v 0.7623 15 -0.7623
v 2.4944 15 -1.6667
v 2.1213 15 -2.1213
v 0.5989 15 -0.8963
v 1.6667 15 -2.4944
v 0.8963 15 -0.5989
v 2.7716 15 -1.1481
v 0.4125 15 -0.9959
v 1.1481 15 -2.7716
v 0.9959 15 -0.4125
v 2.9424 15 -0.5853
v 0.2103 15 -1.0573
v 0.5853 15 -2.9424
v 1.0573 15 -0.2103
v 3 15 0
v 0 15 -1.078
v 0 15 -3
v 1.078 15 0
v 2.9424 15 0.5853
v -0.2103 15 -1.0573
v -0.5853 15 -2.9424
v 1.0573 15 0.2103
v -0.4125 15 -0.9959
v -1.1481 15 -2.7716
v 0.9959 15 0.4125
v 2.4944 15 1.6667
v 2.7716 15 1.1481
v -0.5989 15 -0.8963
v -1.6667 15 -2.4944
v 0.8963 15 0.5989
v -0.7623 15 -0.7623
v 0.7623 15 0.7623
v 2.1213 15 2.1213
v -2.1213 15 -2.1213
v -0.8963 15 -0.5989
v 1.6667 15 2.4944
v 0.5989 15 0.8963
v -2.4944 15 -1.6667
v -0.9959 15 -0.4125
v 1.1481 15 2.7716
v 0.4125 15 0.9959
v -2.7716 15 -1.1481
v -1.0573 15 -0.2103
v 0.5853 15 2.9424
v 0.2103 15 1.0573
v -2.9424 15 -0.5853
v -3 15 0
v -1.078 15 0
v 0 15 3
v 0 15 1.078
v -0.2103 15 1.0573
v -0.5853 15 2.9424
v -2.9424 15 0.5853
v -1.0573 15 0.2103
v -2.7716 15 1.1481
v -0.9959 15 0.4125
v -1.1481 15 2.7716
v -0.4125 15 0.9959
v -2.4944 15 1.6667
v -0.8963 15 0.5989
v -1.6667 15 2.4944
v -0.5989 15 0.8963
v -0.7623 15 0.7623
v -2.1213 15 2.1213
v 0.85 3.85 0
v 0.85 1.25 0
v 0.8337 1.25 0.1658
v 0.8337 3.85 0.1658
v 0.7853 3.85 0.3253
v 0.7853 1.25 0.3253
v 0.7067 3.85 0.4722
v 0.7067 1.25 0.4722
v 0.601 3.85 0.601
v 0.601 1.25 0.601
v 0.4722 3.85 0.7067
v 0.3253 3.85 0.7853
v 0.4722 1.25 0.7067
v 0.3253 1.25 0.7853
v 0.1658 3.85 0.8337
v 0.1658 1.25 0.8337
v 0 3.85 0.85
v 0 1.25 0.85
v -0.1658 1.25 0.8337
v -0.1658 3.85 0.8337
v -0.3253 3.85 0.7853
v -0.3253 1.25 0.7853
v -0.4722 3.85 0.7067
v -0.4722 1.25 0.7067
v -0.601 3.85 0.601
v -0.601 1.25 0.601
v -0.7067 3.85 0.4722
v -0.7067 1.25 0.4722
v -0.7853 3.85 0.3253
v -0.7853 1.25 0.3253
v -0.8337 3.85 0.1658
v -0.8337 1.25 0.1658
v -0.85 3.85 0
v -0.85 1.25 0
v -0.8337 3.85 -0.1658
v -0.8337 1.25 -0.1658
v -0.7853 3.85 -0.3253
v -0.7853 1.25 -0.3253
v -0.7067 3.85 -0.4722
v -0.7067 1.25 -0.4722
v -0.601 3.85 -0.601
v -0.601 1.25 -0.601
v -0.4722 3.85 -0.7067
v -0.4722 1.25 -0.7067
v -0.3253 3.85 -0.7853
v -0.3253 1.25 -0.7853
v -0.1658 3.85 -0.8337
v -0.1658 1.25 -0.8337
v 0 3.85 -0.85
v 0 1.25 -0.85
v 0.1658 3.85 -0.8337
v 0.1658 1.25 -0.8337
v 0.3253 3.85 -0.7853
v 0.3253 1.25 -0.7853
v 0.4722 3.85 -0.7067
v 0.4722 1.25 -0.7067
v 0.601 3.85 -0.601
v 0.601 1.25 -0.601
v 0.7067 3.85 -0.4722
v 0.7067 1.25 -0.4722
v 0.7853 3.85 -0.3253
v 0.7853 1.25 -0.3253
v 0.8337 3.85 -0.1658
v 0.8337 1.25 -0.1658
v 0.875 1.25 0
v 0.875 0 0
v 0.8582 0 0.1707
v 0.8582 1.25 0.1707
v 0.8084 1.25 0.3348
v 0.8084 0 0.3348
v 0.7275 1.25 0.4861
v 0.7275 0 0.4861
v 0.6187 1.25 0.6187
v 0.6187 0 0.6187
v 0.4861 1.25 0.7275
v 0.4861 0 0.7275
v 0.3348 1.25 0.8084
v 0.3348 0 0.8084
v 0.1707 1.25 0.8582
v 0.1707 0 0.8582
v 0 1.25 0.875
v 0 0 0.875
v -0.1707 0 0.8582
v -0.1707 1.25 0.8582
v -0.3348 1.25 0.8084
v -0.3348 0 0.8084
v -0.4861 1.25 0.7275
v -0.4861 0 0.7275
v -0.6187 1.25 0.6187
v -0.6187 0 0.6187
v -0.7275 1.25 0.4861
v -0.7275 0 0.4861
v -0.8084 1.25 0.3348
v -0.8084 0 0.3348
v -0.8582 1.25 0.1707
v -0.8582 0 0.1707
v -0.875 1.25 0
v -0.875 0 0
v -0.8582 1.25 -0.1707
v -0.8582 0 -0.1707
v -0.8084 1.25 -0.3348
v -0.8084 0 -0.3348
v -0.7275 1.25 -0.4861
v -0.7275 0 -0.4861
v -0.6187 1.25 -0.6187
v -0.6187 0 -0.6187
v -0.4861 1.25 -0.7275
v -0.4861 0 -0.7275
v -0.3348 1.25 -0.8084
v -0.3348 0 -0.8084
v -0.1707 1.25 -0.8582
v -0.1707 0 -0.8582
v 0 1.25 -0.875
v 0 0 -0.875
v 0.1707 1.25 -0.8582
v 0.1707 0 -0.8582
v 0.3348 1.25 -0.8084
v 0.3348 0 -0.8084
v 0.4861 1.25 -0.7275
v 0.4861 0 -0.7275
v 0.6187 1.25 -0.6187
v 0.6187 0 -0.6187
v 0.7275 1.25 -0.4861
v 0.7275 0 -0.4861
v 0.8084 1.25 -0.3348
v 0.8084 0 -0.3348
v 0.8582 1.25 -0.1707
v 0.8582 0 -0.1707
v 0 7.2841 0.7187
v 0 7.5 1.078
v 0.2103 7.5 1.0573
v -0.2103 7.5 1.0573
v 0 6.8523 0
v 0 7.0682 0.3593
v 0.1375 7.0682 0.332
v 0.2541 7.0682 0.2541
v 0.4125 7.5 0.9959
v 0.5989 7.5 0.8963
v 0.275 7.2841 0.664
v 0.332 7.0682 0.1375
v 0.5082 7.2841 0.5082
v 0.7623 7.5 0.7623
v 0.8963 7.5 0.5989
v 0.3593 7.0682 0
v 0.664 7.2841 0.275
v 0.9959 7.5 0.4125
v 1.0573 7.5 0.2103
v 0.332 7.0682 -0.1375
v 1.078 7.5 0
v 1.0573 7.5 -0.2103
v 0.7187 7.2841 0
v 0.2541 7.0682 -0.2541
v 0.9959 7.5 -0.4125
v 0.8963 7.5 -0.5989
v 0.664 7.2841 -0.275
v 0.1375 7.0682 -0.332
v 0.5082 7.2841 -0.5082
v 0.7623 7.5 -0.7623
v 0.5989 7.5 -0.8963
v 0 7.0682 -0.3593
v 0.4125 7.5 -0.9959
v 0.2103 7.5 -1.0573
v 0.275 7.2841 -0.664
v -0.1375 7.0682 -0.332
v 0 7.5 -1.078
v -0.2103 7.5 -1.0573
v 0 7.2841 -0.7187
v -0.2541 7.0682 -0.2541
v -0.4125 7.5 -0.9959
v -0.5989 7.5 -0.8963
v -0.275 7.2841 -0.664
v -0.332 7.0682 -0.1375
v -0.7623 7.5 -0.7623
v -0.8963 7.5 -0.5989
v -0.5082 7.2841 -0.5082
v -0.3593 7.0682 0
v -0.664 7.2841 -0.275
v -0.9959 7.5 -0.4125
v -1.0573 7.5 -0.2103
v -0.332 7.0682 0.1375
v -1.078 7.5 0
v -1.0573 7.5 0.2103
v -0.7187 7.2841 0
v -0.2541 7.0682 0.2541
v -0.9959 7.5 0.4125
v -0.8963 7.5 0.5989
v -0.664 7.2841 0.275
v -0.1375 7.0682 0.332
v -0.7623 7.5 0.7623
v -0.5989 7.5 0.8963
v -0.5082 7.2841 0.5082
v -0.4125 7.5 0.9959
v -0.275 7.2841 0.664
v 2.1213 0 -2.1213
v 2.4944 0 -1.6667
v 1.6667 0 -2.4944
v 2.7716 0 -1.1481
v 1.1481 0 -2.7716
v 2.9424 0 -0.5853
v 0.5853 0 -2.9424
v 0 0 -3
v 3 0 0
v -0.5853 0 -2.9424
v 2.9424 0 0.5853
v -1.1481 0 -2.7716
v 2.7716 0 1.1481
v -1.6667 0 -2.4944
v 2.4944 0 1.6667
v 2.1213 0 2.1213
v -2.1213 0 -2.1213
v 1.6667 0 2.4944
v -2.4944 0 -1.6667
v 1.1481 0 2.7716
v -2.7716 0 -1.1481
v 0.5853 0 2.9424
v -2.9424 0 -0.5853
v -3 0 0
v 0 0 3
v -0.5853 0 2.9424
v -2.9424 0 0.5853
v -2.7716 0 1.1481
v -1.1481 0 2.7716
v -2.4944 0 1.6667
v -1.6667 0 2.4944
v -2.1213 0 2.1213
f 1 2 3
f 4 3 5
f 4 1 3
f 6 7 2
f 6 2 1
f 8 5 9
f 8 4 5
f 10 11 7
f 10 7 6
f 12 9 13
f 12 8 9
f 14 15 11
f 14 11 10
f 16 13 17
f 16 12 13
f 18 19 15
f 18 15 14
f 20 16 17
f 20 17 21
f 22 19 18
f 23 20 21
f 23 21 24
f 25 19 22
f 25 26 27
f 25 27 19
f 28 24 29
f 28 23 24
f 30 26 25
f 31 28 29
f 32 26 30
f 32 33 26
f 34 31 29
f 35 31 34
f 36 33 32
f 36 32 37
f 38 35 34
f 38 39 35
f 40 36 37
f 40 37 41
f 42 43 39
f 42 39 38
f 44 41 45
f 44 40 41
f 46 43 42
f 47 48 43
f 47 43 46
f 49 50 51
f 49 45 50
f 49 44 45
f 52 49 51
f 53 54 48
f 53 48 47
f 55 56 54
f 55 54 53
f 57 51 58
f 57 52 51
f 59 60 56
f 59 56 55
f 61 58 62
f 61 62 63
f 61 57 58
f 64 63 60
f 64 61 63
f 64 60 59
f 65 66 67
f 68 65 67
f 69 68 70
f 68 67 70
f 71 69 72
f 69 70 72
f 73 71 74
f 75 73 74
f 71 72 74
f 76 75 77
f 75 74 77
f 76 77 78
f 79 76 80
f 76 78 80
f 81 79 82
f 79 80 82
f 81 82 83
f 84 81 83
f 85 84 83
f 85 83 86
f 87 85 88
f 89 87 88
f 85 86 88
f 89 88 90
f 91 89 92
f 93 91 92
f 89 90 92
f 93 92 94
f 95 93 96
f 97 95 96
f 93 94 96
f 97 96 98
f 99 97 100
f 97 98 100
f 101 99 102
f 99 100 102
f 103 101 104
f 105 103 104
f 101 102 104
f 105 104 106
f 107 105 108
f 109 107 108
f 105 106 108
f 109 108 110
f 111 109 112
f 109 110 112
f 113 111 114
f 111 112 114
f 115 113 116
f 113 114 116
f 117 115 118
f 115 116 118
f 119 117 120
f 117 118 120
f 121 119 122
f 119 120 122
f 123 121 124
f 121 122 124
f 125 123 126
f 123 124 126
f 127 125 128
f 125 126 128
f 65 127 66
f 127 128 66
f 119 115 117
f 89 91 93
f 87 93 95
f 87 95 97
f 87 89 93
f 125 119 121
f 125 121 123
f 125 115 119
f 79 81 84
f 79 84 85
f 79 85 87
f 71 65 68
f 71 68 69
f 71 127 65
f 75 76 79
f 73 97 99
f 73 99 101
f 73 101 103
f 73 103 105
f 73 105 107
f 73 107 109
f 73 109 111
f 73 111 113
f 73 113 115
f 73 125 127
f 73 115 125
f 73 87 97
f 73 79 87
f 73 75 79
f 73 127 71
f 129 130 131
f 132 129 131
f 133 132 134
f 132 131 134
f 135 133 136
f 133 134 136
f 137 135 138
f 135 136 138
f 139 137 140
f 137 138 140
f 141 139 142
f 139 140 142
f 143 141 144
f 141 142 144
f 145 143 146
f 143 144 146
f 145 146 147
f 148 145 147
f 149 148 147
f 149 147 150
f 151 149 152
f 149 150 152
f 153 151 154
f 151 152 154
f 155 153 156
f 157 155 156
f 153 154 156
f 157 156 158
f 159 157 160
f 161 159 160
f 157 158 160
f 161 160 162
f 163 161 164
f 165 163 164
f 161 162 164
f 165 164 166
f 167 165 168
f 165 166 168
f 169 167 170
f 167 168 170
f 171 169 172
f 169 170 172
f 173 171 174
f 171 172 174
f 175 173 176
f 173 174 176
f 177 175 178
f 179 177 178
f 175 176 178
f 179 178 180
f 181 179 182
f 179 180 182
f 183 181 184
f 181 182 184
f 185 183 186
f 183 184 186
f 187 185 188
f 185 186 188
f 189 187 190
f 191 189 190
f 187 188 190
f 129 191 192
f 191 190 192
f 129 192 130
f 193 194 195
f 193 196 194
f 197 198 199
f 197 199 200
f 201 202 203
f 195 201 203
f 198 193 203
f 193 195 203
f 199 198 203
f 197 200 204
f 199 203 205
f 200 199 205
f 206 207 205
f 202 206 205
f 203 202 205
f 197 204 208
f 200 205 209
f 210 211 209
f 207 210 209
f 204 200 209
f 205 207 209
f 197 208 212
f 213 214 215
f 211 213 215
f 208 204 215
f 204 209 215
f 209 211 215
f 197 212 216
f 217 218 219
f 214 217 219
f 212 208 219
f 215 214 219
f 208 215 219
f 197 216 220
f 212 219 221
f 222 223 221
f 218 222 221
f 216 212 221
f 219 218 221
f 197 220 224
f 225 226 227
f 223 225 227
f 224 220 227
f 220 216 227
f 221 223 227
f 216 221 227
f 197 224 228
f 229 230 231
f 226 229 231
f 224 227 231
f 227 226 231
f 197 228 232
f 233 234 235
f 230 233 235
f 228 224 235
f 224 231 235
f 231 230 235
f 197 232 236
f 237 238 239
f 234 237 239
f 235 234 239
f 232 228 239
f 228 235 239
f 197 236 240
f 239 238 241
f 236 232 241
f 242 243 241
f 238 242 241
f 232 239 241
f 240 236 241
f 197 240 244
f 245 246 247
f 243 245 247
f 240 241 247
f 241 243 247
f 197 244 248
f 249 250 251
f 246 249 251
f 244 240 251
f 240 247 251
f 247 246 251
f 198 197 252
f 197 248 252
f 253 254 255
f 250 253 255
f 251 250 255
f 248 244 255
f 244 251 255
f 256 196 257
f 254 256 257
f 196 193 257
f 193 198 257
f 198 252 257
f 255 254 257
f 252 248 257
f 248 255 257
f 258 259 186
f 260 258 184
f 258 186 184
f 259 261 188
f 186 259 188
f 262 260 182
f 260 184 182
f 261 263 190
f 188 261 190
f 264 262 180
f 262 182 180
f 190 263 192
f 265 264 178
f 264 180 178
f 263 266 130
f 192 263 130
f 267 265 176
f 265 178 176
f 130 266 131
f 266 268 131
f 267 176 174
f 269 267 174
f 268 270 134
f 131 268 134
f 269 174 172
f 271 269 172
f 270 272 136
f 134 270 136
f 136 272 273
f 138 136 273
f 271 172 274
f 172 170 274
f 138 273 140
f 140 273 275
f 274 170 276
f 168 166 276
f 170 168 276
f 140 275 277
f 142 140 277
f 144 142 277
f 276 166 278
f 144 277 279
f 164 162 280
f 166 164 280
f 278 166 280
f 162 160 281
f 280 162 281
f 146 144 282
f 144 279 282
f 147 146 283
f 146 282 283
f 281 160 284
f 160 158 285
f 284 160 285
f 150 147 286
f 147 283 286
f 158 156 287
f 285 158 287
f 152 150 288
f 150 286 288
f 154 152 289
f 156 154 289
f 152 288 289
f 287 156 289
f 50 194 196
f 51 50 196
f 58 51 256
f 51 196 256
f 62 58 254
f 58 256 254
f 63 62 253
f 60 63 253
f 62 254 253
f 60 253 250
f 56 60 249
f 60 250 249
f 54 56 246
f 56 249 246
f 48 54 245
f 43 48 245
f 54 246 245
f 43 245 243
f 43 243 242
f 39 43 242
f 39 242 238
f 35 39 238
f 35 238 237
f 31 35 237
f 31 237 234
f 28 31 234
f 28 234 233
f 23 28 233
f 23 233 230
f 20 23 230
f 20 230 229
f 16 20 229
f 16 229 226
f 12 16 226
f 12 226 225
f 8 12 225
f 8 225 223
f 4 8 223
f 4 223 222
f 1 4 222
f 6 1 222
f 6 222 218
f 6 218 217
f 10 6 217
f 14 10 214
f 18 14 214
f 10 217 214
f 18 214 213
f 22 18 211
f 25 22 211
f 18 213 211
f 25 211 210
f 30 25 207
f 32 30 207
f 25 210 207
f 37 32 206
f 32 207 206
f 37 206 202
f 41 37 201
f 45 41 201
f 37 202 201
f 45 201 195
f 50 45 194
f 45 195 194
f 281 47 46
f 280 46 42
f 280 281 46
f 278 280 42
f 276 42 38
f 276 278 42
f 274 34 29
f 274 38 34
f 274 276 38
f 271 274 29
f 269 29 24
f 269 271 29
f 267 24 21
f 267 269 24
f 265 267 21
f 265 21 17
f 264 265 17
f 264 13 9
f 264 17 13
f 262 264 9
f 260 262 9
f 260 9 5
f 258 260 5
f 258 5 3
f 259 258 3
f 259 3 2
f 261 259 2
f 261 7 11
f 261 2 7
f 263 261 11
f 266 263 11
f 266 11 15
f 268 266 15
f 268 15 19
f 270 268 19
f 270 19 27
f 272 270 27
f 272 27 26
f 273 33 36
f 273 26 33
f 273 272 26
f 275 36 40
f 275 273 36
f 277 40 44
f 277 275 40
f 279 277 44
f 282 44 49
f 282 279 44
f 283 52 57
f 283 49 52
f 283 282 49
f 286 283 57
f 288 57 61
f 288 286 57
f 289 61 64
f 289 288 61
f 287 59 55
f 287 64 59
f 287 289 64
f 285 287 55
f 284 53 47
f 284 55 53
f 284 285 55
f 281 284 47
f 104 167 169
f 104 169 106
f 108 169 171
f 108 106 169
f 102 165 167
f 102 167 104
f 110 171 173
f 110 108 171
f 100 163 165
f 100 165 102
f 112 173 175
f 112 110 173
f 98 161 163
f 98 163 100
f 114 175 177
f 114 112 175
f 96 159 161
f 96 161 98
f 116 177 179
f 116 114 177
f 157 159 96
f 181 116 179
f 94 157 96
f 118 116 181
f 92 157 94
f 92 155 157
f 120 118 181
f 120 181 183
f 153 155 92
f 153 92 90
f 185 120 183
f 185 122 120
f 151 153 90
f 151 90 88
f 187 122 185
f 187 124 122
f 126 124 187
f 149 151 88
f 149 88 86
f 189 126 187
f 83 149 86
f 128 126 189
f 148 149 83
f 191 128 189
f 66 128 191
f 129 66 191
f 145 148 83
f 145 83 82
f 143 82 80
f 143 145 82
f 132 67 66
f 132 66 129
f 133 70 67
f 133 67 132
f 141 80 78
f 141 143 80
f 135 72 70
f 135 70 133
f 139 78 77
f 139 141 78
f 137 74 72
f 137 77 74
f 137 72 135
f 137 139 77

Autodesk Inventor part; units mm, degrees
ref_plane "YZ Plane" through (0, 0, 0) normal (1, 0, 0) x (0, 1, 0)
ref_plane "XZ Plane" through (0, 0, 0) normal (0, 1, 0) x (-1, 0, 0)
ref_plane "XY Plane" through (0, 0, 0) normal (0, 0, 1) x (1, 0, 0)
sketch "Sketch1" plane through (0, 0, 0) normal (0, 1, 0) x (-1, 0, 0)
  circle A0 centre (0, 0) radius 3
  dimension "d0" = 6
extrude "Extrusion1" add sketch "Sketch1" along normal blind 15
sketch "Sketch2" plane through (0, 15, 0) normal (0, 1, 0) x (1, 0, 0)
  point P0 (0, 0)
  point P1 (0, 0)
hole "Hole1" at (0, 15, 0) direction (0, -1, 0) diameter 2.156 depth 7.5 tip angle 118 thread size "4-40 UNC" class "2B" standard "ANSI Unified Screw Threads"
sketch "Sketch3" plane through (0, 0, 0) normal (0, -1, 0) x (1, 0, 0)
  circle A0 centre (0, 0) radius 1.078 projected
  circle A1 centre (0, 0) radius 0.85
  dimension "d10" = 1.7
extrude "Extrusion2" cut sketch "Sketch3" against normal blind 3.85 contours A1
sketch "Sketch4" plane through (0, 0, 0) normal (0, -1, 0) x (1, 0, 0)
  circle A0 centre (0, 0) radius 0.85 projected
  circle A1 centre (0, 0) radius 3 projected
  circle A2 centre (0, 0) radius 0.85 projected
  circle A3 centre (0, 0) radius 0.875
  dimension "d13" = 1.75
extrude "Extrusion3" cut sketch "Sketch4" against normal blind 1.25 contours A3
properties part number "pin_adapter"
